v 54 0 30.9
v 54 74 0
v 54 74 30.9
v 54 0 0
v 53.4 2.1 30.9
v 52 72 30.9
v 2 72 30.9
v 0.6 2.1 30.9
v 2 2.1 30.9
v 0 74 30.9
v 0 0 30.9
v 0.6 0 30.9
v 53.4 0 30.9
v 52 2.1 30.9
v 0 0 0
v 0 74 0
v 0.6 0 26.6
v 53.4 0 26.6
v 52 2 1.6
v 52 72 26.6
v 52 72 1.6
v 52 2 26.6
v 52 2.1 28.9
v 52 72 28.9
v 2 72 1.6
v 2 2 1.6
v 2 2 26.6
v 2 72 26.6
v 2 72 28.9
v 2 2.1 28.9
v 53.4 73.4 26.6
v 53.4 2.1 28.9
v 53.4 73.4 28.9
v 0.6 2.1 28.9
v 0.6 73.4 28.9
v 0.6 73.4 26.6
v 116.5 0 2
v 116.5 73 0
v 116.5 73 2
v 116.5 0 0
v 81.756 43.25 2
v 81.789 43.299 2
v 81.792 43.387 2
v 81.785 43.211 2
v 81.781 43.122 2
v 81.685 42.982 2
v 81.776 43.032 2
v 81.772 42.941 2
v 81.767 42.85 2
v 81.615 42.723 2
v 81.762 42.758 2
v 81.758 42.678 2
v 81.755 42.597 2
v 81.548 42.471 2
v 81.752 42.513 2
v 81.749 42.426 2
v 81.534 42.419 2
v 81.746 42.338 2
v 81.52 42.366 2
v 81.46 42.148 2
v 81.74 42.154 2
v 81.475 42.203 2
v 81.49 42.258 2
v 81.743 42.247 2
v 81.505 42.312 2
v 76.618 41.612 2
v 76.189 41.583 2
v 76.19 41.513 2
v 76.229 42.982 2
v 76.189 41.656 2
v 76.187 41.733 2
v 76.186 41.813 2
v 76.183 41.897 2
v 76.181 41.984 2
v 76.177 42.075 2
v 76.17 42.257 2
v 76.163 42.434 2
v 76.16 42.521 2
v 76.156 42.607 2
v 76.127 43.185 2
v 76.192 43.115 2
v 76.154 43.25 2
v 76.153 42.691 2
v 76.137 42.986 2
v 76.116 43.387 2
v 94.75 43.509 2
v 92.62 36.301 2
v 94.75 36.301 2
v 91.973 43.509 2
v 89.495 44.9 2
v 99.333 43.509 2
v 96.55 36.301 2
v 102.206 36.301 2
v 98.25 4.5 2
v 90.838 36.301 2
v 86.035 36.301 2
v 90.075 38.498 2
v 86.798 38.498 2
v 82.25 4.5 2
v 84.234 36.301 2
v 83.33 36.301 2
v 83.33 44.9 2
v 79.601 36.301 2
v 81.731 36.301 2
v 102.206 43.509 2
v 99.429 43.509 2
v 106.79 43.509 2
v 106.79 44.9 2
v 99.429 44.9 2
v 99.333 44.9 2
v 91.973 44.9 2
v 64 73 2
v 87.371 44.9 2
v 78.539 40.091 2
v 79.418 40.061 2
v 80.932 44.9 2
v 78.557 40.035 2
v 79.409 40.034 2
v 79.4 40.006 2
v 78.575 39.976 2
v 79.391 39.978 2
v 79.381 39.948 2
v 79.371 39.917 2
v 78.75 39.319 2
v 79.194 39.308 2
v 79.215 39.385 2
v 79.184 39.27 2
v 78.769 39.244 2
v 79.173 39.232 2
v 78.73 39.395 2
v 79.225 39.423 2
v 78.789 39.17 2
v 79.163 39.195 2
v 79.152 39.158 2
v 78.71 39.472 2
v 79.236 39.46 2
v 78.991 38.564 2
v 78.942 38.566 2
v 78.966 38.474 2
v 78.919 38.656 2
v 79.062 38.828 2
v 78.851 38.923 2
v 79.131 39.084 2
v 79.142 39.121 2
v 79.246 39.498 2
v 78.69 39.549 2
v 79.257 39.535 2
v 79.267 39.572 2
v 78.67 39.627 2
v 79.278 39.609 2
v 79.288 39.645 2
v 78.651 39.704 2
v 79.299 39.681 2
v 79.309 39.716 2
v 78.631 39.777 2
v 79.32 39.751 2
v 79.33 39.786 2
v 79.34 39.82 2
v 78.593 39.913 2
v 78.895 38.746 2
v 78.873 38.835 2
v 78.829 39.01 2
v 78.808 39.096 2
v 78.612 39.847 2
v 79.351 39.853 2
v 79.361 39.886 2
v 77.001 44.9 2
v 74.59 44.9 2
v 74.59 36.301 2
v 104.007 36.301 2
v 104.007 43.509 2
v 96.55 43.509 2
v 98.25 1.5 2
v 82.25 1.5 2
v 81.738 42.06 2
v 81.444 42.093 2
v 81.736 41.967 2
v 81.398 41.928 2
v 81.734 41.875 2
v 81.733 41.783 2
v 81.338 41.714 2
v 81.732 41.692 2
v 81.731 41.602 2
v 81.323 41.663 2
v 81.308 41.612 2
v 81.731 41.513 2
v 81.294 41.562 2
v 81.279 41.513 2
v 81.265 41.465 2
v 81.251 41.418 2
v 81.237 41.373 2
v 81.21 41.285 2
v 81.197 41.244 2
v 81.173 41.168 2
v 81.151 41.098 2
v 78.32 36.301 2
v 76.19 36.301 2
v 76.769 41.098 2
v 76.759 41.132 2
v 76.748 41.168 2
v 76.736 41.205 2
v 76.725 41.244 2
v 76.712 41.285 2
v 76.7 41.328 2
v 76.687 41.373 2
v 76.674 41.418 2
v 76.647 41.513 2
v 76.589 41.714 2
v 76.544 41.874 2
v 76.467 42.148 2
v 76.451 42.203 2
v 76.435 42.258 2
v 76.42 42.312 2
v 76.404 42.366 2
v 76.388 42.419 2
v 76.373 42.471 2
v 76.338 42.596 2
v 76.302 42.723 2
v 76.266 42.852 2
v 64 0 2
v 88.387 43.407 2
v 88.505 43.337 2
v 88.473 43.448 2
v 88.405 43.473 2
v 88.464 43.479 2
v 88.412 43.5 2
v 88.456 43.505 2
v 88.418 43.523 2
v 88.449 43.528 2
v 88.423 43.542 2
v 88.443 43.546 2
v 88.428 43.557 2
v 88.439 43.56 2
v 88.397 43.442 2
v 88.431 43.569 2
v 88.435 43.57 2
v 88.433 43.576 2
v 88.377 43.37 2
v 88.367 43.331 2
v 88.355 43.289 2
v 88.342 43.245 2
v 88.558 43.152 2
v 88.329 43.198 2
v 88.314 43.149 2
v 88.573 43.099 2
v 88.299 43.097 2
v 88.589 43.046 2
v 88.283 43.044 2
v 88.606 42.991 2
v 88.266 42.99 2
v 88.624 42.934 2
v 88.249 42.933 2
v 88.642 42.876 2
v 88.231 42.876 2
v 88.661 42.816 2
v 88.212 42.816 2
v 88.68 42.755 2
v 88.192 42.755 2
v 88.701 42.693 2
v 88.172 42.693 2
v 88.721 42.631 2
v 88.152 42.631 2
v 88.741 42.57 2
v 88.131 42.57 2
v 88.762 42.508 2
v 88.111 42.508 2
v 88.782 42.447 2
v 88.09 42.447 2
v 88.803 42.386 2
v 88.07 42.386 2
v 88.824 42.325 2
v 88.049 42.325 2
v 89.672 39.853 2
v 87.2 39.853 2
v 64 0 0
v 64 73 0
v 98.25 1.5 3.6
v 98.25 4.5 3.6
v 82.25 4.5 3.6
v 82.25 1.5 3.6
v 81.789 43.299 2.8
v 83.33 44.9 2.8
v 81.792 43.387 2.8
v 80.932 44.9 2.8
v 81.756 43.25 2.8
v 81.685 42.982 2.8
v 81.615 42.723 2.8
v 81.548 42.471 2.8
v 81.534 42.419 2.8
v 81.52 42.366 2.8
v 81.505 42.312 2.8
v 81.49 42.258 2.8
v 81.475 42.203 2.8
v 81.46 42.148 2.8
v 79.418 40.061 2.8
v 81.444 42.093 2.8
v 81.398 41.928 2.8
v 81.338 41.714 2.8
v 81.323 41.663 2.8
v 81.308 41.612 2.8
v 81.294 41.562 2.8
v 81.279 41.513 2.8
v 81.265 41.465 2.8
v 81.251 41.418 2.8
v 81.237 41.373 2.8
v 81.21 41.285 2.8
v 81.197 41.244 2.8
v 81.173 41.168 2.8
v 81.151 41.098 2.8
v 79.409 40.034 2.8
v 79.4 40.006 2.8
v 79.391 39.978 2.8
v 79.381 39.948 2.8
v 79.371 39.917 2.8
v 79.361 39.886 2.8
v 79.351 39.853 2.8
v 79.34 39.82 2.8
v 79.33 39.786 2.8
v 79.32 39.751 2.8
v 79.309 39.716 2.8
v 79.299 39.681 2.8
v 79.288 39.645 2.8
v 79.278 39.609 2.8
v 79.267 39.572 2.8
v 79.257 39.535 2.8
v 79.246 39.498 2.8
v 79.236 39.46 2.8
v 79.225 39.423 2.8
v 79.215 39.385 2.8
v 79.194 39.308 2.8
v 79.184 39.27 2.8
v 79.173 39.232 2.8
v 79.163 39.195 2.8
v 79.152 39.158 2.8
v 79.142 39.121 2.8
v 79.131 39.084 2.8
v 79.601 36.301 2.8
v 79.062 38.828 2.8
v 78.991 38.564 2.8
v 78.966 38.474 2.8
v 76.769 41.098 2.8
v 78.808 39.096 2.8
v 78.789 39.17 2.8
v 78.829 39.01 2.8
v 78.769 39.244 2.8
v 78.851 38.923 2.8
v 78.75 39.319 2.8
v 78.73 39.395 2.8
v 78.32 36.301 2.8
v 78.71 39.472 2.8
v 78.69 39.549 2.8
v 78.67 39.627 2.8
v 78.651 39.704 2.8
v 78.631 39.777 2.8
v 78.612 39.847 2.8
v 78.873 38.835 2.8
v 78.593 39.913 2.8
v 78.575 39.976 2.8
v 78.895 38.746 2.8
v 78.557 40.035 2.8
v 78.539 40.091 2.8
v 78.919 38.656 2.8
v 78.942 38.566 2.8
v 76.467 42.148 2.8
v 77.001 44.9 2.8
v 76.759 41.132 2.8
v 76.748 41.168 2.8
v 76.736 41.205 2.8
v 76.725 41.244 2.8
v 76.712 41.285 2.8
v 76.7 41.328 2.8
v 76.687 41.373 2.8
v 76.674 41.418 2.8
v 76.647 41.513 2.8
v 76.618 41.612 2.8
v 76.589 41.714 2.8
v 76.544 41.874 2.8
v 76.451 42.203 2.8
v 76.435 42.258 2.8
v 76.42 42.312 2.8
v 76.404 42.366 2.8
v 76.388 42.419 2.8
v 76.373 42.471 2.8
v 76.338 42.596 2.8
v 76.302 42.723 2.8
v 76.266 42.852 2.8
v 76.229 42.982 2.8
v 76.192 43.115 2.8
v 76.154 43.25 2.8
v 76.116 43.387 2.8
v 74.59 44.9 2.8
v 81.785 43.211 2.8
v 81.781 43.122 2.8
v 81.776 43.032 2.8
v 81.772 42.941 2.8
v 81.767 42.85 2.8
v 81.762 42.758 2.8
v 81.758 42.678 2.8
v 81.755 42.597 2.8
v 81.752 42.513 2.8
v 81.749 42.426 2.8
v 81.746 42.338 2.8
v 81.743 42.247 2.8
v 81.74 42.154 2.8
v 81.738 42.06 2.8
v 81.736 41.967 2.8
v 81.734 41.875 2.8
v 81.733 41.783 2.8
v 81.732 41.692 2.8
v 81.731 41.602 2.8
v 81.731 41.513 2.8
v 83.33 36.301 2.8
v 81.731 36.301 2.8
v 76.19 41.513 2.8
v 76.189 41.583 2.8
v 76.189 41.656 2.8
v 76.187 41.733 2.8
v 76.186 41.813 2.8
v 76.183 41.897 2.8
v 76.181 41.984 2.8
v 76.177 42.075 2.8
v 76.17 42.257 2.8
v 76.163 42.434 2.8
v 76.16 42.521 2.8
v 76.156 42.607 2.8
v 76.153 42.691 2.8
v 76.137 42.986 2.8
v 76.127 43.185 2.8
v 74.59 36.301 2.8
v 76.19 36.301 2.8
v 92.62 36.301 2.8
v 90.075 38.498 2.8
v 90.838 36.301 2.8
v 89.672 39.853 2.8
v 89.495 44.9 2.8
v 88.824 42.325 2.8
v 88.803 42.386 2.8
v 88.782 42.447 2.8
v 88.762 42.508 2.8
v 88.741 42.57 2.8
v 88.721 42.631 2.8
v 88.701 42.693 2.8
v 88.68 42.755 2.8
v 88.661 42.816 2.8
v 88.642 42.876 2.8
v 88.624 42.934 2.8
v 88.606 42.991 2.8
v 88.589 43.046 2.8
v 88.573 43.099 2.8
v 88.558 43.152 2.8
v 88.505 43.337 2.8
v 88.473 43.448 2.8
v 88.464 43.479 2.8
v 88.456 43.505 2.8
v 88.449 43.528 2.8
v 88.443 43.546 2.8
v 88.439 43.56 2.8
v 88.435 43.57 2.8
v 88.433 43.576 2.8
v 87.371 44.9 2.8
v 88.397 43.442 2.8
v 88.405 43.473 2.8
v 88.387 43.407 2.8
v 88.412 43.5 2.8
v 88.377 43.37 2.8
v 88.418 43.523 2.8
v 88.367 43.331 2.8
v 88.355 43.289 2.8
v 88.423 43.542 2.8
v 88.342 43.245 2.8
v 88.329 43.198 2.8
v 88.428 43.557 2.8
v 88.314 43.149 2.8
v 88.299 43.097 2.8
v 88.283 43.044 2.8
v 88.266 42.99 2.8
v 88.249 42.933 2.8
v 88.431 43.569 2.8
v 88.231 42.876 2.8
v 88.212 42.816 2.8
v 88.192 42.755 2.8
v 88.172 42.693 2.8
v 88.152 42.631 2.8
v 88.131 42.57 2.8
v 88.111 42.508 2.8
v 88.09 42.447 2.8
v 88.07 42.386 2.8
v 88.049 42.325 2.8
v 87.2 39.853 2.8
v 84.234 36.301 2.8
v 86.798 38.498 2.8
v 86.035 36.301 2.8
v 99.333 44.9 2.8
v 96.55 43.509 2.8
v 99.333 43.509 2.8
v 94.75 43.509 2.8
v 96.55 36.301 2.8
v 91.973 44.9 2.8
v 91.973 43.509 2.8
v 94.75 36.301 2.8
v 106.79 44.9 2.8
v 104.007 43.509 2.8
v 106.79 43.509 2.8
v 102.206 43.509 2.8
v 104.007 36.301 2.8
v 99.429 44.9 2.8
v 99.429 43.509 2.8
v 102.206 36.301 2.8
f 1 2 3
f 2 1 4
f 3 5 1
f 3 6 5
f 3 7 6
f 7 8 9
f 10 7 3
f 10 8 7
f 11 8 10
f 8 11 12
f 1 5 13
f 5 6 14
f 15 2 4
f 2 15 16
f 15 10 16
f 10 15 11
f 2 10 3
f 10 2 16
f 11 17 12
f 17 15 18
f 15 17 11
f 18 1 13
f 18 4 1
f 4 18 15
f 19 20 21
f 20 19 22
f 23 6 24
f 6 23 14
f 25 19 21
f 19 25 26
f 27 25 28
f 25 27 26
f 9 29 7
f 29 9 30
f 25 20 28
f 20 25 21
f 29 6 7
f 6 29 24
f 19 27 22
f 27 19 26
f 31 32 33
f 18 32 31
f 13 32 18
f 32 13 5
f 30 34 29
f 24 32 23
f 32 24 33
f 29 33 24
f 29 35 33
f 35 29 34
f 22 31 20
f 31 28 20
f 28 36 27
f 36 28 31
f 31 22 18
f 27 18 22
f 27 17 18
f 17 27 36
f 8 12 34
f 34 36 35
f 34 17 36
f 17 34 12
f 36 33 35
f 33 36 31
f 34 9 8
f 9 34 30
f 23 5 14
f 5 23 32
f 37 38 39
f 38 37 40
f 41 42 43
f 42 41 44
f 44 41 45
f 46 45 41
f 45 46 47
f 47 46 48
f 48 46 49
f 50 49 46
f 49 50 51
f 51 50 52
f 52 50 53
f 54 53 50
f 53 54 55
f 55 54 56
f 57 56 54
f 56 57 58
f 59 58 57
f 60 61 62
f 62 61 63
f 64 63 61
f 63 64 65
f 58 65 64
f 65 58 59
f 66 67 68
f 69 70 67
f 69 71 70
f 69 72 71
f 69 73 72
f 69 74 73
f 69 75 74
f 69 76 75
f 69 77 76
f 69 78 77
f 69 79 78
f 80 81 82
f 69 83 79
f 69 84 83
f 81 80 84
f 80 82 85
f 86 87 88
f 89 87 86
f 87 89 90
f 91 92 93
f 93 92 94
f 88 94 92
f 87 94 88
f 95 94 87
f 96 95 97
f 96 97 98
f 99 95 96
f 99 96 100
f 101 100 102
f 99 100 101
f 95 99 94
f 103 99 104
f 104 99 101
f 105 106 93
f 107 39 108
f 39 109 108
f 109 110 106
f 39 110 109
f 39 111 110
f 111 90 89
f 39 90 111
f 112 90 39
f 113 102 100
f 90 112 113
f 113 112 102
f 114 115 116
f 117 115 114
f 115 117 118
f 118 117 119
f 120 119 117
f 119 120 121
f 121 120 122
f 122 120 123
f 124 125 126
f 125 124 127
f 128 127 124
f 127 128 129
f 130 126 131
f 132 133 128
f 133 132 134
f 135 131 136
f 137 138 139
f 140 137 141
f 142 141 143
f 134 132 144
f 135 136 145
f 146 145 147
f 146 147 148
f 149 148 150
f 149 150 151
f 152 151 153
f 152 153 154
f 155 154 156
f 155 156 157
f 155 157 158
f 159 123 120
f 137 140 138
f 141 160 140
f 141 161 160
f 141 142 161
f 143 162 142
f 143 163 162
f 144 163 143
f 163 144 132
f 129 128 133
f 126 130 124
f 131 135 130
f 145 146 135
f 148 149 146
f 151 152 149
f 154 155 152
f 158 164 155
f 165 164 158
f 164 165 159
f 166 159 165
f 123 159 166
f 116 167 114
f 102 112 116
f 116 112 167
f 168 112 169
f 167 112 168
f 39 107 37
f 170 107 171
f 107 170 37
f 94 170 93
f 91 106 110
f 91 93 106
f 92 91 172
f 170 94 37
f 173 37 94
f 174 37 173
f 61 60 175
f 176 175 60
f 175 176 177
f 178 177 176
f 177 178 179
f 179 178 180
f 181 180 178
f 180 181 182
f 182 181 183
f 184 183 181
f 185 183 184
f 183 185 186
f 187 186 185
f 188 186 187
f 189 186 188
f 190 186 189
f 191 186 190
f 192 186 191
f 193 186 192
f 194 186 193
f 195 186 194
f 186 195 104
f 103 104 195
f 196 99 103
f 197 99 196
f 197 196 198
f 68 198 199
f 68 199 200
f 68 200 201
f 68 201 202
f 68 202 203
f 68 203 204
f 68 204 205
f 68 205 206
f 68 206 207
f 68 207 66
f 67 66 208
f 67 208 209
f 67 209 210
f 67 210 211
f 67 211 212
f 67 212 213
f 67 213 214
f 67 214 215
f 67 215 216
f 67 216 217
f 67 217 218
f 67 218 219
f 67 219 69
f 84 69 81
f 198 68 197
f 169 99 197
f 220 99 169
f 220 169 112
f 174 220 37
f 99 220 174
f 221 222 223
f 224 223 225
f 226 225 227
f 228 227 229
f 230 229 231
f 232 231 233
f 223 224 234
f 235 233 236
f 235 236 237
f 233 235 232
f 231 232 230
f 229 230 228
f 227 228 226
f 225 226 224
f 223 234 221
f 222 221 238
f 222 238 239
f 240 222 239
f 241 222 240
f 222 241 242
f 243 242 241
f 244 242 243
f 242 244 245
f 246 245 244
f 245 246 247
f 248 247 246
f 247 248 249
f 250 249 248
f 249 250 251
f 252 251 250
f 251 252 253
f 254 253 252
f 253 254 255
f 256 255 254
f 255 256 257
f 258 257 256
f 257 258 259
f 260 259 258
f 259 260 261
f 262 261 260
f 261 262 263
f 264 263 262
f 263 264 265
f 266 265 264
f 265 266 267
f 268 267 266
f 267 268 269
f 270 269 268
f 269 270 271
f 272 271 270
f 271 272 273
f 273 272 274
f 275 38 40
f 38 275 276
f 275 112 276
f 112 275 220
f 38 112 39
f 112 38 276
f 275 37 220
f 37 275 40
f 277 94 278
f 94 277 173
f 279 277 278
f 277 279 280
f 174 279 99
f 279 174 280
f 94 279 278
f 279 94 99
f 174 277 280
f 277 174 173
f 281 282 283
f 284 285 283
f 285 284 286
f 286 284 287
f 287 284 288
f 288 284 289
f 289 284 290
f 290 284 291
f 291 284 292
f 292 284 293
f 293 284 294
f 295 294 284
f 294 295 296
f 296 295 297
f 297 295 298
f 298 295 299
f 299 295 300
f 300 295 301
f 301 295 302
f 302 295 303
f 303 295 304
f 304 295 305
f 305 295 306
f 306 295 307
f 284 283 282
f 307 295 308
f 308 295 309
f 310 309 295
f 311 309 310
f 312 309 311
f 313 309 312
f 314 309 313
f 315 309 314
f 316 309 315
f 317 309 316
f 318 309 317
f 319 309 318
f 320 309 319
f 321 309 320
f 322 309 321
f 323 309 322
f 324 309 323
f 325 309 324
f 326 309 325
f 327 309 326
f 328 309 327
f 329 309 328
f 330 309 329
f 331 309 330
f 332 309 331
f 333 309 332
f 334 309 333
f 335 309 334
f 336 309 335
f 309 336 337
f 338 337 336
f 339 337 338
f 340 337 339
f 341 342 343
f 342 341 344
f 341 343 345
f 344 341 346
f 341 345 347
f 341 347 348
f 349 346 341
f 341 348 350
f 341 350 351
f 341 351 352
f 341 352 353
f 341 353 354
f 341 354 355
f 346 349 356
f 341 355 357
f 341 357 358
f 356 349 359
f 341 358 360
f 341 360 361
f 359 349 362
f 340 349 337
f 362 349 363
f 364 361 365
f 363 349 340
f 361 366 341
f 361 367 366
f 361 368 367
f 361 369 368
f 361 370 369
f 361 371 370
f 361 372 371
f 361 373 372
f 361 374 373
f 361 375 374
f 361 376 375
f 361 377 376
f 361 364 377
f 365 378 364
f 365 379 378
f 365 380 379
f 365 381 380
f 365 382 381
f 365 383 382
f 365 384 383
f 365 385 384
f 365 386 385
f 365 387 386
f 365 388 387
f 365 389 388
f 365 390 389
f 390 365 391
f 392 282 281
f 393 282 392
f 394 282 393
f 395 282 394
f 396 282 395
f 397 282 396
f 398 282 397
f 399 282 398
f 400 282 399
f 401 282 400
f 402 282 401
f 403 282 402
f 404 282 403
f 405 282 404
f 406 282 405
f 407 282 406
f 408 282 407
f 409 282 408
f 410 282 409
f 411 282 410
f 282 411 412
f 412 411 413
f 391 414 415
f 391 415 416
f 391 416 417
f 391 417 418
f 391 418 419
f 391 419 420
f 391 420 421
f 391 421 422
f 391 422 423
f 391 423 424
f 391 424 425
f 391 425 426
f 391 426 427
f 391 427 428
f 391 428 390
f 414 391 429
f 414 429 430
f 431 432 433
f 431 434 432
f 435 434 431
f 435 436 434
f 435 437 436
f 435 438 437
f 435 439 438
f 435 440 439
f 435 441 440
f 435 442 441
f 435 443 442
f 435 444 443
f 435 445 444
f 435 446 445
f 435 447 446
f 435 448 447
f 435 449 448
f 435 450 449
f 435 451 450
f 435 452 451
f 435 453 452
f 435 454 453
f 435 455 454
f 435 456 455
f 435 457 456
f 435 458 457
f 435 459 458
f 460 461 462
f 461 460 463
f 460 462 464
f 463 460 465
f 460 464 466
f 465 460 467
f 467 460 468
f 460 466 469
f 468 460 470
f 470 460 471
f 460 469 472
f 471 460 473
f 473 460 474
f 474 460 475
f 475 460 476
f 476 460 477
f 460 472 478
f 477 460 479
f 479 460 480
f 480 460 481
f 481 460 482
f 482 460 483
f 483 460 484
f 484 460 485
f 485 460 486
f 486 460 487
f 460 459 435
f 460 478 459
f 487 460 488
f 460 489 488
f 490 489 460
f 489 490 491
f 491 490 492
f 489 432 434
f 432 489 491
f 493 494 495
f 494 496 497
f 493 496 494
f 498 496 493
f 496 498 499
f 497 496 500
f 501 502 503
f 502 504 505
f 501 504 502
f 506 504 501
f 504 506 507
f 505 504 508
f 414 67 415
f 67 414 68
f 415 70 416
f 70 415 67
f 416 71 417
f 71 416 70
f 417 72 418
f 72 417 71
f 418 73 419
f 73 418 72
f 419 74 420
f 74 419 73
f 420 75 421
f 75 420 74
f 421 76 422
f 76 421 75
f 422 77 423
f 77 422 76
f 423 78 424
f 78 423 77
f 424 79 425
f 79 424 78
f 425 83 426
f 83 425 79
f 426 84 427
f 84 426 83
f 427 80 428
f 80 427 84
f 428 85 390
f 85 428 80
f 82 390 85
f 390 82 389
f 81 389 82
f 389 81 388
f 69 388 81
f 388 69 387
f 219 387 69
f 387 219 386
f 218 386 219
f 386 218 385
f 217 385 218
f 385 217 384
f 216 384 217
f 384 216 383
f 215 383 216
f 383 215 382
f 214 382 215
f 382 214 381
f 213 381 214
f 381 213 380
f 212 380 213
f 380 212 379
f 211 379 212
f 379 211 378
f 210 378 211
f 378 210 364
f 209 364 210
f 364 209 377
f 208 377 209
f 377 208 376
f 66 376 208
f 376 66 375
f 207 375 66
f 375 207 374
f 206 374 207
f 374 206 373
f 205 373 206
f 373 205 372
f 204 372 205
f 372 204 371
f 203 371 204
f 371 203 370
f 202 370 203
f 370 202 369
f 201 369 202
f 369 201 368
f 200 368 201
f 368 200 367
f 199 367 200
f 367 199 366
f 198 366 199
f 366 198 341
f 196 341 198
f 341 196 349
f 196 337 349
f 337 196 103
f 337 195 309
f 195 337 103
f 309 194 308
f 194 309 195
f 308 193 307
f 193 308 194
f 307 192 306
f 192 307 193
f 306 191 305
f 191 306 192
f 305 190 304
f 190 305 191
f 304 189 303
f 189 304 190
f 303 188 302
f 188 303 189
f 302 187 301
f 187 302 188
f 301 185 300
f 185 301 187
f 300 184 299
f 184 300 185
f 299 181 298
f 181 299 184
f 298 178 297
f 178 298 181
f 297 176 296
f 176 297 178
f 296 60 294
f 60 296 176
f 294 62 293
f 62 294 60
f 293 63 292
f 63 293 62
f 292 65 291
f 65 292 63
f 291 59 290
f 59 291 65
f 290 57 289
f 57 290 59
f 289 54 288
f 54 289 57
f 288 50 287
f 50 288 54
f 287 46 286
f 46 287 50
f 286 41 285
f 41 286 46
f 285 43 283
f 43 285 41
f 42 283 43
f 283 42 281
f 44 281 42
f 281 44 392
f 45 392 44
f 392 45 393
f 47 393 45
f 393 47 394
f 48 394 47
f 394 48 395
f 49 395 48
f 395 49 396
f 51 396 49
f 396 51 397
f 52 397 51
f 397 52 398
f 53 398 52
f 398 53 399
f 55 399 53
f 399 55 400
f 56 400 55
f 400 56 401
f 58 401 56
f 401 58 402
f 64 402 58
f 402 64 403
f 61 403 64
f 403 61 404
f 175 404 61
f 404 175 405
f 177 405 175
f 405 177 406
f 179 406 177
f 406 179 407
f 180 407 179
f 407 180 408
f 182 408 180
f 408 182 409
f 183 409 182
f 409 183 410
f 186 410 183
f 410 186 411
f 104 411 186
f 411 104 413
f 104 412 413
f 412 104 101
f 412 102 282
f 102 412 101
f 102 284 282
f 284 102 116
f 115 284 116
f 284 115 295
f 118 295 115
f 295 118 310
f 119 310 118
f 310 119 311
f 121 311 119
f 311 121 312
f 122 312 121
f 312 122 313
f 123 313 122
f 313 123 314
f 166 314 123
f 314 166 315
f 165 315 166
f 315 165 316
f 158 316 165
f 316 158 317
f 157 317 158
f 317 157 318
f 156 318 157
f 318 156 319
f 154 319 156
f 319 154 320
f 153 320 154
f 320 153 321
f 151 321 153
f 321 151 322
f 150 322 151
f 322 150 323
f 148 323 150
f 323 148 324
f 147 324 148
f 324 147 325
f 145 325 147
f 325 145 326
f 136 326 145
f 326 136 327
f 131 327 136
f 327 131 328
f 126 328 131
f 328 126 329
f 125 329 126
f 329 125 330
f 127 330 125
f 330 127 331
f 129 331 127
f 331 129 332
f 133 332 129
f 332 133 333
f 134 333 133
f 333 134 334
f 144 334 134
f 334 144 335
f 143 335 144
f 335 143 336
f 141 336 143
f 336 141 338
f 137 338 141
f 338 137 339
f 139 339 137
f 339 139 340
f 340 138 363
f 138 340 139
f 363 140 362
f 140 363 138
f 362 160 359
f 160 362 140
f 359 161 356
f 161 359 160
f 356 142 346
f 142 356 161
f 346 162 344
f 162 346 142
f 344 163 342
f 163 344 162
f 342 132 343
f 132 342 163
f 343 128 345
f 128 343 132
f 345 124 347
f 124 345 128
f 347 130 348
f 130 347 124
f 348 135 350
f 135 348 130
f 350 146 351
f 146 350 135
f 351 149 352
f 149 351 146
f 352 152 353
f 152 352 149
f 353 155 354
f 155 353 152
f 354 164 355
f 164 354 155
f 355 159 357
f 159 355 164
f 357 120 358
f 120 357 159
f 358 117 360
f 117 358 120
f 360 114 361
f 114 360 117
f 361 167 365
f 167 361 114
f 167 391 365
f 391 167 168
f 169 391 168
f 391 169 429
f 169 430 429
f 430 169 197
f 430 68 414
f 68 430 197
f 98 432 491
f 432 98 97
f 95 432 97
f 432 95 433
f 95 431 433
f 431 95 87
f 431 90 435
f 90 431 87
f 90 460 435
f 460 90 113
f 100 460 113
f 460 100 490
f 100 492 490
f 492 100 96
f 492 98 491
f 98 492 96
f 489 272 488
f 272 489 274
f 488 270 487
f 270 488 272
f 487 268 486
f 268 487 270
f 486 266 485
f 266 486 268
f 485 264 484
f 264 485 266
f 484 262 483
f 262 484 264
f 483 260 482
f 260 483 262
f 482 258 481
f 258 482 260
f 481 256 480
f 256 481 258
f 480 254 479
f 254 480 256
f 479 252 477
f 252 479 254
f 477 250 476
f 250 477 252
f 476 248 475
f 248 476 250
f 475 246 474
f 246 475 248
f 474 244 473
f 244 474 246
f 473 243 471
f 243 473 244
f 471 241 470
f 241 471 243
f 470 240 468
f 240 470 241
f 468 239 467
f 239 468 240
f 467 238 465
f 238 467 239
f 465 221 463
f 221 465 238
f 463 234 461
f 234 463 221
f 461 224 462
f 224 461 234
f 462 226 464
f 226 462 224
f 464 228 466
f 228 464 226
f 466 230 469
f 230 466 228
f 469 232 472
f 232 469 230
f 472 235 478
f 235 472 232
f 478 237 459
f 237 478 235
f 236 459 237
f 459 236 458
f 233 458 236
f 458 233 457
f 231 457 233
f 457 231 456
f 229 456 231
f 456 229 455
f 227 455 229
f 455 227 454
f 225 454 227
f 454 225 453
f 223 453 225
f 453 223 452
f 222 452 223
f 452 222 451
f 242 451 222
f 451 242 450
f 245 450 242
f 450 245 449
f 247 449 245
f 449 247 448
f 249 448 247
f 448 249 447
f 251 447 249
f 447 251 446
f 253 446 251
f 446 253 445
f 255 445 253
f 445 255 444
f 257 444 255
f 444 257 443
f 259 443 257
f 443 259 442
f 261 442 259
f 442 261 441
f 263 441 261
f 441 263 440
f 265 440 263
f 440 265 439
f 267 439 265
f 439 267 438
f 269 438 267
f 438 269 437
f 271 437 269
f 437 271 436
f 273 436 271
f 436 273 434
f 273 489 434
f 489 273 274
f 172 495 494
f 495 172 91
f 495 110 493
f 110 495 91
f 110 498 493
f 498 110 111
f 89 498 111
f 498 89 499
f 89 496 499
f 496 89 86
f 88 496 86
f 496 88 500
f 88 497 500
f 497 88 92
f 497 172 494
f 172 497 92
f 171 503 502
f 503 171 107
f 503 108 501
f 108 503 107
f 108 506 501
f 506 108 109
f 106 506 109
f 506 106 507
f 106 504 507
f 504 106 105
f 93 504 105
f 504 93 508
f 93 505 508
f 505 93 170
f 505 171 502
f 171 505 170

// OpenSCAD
// ============================================================
// GIFT BOX — because a printed gift deserves a printed box
// ============================================================
// A box with a SLIDING LID and a name on top. Size it to your
// gift, put their name on the lid, done — the box is half the
// present. (Gift playbook: program/09-gifts-and-occasions.md)
//
// The lid slides on rails cut into the box walls. The fit comes
// from `slide_gap` — start with your clearance-test winner;
// a touch bigger slides silkier.
//
// Print: both parts flat as placed, no supports. ~1-2 hrs
// depending on size. Silk PLA makes it look store-bought.
// ============================================================

// ------------ CHANGE THESE ------------
inner_w   = 50;      // inside width  (measure your gift + 2mm!)
inner_d   = 70;      // inside depth
inner_h   = 25;      // inside height
name      = "MATT";  // who's it for? ("" for a plain lid)
slide_gap = 0.30;    // lid clearance — from family/clearance-test.scad
// ---------------------------------------

wall   = 2.0;    // box wall thickness
floor_t = 1.6;   // box floor
lid_t  = 2.0;    // lid plate thickness
rail   = 1.4;    // how far the lid tongue reaches into the walls
rim    = 2.0;    // solid rim above the lid groove

$fn = 48;

outer_w = inner_w + 2*wall;
outer_d = inner_d + 2*wall;
groove_z = floor_t + inner_h;              // lid slides at this height
outer_h  = groove_z + lid_t + slide_gap + rim;

// ================= the box =================
difference() {
    cube([outer_w, outer_d, outer_h]);

    // the inside of the box — cut all the way to the sky, so the
    // top is OPEN over the gift; only the rail lip stays above the
    // groove (that lip is what holds the lid down)
    translate([wall, wall, floor_t])
        cube([inner_w, inner_d, outer_h]);

    // lid groove: widen the opening into the left/right/back walls
    translate([wall - rail, wall - rail, groove_z])
        cube([inner_w + 2*rail, inner_d + 2*rail, lid_t + slide_gap]);

    // front slot: remove the front wall above the groove so the
    // lid can slide in from the front
    translate([wall - rail, -0.1, groove_z])
        cube([inner_w + 2*rail, wall + 0.2, lid_t + slide_gap + rim + 0.1]);
}

// ================= the lid (printed beside the box) =================
lid_w = inner_w + 2*rail - slide_gap;
lid_l = inner_d + rail + wall - 0.4;   // front edge sits flush-ish
translate([outer_w + 10, 0, 0]) {
    cube([lid_w, lid_l, lid_t]);
    // finger grip bar on the front edge
    translate([lid_w/2 - 8, 1.5, lid_t])
        cube([16, 3, 1.6]);
    // the name, raised on top
    if (name != "")
        translate([lid_w/2, lid_l/2 + 4, lid_t])
            linear_extrude(0.8)
                text(name, size = min(9, (lid_w - 8) / max(1, len(name)) / 0.7),
                     font = "Liberation Sans:style=Bold",
                     halign = "center", valign = "center");
}

// IDEAS TO TRY (or ask Claude):
//  - a heart-shaped or hexagonal box for Valentine's
//  - emboss the date under the name (birthday keepsake)
//  - a divider grid inside for tiny parts (calibrate to the gift)
//  - print box and lid in contrasting colors, name in a third
